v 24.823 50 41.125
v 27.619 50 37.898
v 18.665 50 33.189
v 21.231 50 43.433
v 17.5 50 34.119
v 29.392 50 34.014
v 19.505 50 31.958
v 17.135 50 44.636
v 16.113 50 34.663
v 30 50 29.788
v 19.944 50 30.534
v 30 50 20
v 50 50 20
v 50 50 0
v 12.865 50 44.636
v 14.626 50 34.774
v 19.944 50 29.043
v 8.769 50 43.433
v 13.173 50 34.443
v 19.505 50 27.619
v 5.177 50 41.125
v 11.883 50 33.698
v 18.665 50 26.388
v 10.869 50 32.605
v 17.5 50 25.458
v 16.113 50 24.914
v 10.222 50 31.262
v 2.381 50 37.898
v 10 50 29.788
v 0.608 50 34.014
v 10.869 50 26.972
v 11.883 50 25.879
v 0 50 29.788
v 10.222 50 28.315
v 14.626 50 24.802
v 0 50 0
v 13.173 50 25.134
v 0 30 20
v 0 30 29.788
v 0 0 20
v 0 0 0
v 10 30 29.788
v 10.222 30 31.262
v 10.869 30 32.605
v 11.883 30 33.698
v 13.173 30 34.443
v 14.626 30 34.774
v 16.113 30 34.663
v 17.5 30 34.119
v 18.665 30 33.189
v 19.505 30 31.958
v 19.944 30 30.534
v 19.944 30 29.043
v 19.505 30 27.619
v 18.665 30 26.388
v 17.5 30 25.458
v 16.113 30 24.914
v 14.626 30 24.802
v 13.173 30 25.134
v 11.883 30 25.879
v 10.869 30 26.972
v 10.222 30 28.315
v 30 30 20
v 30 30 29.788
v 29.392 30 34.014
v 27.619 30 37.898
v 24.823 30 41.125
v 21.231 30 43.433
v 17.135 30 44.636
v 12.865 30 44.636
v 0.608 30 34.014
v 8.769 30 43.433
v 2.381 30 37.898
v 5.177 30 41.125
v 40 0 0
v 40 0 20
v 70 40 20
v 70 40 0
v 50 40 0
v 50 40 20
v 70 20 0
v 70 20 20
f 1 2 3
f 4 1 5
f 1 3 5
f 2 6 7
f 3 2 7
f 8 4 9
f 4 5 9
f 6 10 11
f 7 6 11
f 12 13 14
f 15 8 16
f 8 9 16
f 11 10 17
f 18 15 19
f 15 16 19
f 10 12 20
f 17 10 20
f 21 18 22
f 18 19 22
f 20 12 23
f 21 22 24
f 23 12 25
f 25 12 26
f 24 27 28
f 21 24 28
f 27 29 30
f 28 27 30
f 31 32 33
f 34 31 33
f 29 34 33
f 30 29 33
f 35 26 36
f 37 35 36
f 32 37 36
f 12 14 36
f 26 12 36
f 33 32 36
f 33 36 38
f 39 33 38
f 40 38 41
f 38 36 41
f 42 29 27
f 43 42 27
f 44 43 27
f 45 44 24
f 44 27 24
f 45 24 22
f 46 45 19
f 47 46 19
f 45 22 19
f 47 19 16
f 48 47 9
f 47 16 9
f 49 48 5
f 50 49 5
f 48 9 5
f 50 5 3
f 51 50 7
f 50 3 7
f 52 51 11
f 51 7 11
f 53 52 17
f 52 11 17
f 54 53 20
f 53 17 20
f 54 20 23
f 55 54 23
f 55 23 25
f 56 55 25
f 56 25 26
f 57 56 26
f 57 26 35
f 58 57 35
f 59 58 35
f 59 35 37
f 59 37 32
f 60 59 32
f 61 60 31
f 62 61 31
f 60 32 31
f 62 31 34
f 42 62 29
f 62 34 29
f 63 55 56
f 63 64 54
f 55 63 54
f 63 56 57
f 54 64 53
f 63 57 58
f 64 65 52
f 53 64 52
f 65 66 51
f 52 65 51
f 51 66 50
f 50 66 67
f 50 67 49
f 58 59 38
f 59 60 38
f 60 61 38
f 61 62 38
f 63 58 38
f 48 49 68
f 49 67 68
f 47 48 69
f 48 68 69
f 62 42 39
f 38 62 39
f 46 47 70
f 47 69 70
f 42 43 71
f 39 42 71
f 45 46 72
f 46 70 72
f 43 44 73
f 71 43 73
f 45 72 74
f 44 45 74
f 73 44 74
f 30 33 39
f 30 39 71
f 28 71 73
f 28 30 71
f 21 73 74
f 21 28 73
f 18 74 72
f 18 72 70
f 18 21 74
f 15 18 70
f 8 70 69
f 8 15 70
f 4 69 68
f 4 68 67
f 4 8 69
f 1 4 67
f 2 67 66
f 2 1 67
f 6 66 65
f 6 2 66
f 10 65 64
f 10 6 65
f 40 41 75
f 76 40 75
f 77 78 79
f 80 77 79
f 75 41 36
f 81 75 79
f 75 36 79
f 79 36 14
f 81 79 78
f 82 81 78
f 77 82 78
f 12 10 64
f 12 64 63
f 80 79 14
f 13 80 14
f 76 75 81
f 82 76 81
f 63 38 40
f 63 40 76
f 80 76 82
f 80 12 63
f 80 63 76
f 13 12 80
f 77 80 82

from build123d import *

# Parameters (mm, degrees)
F1_DEPTH = 20
F3_DEPTH = 20
F4_R     = 5
F5_DEPTH = 20


with BuildPart() as f1:
    # F0 (on Top) → F1 (new body)
    with BuildSketch(Plane.XY):
        Polygon((0, 50), (0, 0), (40, 0), (70, 20), (70, 40), (50, 40), (50, 50), align=None)
    extrude(amount=F1_DEPTH)

    # F2 (on face) → F3 (join)
    with BuildSketch(Plane(origin=(0, 50, 0), x_dir=(-1, 0, 0), z_dir=(0, 1, 0))):
        with BuildLine():
            Line((-3.633996, 20), (0, 20))
            Line((0, 20), (0, 29.788461))
            ThreePointArc((0, 29.788461), (-0.937816, 24.567831), (-3.633996, 20))
        make_face()
        with BuildLine():
            ThreePointArc((-26.366004, 20), (-29.062184, 24.567831), (-30, 29.788461))
            Line((-30, 29.788461), (-30, 20))
            Line((-30, 20), (-26.366004, 20))
        make_face()
        with BuildLine():
            Line((0, 0), (0, 20))
            Line((0, 20), (-3.633996, 20))
            ThreePointArc((-3.633996, 20), (-15, 14.788461), (-26.366004, 20))
            Line((-26.366004, 20), (-30, 20))
            Line((-30, 20), (-50, 20))
            Line((-50, 20), (-50, 0))
            Line((-50, 0), (0, 0))
        make_face()
        with BuildLine():
            Line((-30, 29.788461), (0, 29.788461))
            ThreePointArc((0, 29.788461), (-15, 44.788461), (-30, 29.788461))
        make_face()
        with BuildLine():
            ThreePointArc((-3.633996, 20), (-0.937816, 24.567831), (0, 29.788461))
            Line((0, 29.788461), (-30, 29.788461))
            ThreePointArc((-30, 29.788461), (-29.062184, 24.567831), (-26.366004, 20))
            Line((-26.366004, 20), (-3.633996, 20))
        make_face()
    extrude(amount=-F3_DEPTH)

    # F4 (on face) → F5 (cut, through all)
    with BuildSketch(Plane(origin=(0, 50, 0), x_dir=(-1, 0, 0), z_dir=(0, 1, 0))):
        with Locations((-15, 29.788461)):
            Circle(F4_R)
    extrude(amount=-F5_DEPTH, mode=Mode.SUBTRACT)


solid = f1.part
